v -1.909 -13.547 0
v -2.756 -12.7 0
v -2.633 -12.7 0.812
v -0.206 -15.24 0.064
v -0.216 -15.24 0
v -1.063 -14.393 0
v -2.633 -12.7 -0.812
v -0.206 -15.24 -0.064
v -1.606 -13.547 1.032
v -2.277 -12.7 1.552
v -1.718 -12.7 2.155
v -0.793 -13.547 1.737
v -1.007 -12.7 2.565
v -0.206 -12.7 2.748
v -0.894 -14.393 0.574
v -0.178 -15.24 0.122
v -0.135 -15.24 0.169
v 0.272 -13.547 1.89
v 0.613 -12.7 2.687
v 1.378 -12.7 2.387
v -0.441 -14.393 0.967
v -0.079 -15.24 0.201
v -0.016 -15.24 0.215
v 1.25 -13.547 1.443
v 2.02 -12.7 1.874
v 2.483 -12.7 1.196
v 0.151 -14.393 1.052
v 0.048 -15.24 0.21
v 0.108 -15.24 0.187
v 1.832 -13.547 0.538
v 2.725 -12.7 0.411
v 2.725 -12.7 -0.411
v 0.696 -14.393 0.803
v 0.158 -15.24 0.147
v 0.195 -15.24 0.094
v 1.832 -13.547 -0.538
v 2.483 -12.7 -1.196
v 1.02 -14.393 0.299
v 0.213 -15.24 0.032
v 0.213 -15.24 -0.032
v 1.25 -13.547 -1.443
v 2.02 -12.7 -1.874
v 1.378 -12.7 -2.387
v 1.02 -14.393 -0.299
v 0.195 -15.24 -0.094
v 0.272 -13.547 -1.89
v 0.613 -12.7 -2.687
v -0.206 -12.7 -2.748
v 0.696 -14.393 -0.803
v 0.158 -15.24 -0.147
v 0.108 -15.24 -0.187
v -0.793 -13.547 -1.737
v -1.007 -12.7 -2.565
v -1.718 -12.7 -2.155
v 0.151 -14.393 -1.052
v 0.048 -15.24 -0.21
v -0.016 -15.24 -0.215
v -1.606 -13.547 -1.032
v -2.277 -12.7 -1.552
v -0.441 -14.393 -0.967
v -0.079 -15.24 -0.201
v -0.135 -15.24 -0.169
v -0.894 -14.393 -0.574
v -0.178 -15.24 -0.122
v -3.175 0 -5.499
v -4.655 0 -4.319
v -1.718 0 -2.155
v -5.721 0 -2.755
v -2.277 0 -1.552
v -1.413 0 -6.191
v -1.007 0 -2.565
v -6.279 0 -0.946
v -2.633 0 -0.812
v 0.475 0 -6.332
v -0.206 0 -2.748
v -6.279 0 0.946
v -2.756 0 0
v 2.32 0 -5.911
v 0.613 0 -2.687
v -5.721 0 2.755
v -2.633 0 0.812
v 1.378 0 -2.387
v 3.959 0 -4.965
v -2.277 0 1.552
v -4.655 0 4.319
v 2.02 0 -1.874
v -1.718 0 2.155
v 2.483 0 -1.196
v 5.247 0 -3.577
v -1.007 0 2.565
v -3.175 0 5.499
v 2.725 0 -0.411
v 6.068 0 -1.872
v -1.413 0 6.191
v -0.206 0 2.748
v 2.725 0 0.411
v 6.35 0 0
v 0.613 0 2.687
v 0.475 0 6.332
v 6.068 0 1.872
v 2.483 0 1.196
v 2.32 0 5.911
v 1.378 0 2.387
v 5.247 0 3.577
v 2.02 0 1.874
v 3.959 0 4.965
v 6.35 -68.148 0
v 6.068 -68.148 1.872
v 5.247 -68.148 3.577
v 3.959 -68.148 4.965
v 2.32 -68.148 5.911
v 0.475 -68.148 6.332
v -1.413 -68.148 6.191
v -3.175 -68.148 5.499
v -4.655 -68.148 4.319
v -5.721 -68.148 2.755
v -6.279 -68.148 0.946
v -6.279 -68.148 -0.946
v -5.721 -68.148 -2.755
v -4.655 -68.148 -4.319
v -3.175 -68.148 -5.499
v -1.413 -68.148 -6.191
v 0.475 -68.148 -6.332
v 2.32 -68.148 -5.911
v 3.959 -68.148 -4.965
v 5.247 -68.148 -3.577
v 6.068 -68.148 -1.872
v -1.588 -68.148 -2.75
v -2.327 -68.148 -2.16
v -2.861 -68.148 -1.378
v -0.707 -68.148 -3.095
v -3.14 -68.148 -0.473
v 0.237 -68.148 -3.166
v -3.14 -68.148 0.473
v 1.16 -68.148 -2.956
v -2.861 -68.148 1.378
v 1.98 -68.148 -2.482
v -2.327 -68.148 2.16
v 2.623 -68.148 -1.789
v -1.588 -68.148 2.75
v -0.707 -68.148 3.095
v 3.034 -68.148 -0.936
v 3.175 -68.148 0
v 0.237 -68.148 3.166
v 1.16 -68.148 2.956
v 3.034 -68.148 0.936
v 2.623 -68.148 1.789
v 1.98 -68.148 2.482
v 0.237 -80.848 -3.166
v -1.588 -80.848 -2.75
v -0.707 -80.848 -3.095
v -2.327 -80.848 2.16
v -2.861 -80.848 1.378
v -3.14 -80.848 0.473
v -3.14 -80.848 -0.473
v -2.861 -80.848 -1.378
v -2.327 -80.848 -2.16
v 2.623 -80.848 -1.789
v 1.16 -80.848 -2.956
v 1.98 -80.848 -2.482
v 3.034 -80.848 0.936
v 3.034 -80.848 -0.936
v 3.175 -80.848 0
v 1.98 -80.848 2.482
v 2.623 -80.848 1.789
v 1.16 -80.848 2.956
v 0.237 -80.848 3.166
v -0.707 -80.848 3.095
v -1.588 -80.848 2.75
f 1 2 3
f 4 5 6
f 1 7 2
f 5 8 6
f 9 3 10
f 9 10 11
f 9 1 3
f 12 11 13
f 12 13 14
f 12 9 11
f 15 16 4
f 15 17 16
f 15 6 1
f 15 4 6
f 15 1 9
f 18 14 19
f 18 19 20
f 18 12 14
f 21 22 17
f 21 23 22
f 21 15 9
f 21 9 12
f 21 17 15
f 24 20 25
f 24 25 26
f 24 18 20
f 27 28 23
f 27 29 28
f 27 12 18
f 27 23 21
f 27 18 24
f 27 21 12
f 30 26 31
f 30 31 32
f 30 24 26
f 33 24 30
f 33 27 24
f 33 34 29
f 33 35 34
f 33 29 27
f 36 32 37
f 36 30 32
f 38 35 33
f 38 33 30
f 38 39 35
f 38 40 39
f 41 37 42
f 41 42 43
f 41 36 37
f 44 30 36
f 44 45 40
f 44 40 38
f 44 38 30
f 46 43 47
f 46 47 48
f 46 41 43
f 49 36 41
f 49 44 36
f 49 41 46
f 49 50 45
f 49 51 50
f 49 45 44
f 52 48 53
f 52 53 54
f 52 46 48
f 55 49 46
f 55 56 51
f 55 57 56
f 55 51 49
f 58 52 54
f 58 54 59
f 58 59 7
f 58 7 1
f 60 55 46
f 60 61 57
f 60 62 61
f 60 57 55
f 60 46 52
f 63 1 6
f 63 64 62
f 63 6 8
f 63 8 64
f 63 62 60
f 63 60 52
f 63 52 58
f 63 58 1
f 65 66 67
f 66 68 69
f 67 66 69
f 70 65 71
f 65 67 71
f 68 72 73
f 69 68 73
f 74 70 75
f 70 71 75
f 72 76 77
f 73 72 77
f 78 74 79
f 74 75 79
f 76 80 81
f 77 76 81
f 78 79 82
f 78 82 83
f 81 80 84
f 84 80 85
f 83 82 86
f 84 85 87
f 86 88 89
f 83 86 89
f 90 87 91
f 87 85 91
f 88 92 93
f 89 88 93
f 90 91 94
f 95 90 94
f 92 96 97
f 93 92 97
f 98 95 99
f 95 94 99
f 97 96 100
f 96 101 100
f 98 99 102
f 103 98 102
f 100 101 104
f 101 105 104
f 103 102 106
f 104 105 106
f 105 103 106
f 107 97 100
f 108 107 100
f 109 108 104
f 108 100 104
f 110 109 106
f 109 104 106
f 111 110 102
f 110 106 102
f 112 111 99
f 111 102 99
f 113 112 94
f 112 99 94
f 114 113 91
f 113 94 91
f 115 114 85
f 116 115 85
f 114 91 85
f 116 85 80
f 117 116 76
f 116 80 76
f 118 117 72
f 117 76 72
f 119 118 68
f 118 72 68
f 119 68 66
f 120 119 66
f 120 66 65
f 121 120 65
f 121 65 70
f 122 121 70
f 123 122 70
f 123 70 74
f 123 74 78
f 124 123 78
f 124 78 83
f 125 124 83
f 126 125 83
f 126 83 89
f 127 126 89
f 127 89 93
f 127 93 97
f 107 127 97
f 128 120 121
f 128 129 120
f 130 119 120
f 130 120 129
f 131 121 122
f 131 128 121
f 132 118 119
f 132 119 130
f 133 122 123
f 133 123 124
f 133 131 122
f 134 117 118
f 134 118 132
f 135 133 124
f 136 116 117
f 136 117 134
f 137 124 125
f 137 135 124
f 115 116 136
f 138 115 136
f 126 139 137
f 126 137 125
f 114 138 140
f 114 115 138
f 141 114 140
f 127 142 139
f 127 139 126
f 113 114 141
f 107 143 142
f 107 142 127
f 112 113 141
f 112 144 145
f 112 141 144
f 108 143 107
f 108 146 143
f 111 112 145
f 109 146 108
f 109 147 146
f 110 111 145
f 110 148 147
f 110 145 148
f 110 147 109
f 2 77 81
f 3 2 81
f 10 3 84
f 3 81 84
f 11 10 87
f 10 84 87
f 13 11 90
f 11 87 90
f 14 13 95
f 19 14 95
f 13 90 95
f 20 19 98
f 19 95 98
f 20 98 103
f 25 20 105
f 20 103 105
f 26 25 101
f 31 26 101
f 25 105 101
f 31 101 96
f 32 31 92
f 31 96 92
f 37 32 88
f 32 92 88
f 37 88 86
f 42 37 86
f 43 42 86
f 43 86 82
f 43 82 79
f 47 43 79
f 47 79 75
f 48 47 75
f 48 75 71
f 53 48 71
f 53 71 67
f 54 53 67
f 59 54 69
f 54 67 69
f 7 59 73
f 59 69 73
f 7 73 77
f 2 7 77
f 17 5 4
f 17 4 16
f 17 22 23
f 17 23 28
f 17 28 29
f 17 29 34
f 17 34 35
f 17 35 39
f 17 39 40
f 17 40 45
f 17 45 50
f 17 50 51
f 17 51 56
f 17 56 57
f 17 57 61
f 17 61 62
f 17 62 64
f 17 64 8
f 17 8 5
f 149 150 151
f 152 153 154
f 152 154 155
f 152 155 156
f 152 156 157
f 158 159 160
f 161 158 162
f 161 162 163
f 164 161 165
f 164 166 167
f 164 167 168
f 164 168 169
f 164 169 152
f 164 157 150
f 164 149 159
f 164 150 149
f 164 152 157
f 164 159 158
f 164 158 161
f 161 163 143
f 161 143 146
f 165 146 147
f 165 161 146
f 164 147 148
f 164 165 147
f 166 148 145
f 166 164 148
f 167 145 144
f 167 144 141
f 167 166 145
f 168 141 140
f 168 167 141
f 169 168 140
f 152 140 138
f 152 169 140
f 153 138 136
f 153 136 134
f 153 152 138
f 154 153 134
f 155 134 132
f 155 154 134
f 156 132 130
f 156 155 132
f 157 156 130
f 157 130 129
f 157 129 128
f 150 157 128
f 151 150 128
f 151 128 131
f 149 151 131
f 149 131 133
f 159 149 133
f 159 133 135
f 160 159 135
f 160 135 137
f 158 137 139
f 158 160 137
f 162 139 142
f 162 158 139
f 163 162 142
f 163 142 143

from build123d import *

# Parameters (mm, degrees)
F0_R     = 6.35
F1_DEPTH = 80.8482
F2_R     = 6.35
F2_R_2   = 3.175
F3_DEPTH = 12.7
F4_R     = 2.7559
F5_DEPTH = 12.7
F6_R     = 2.7559
F7_DEPTH = 2.54
F7_TAPER = 45


with BuildPart() as f1:
    # F0 (on Front) → F1 (new body)
    with BuildSketch(Plane.XZ):
        Circle(F0_R)
    extrude(amount=F1_DEPTH)

    # F2 (on face) → F3 (cut)
    with BuildSketch(Plane.XZ.offset(80.8482)):
        Circle(F2_R)
        Circle(F2_R_2, mode=Mode.SUBTRACT)
    extrude(amount=-F3_DEPTH, mode=Mode.SUBTRACT)

    # F4 (on face) → F5 (cut)
    with BuildSketch(Plane(origin=(0, 0, 0), x_dir=(-1, 0, 0), z_dir=(0, 1, 0))):
        Circle(F4_R)
    extrude(amount=-F5_DEPTH, mode=Mode.SUBTRACT)

    # F6 (on face) → F7 (cut)
    with BuildSketch(Plane(origin=(0, -12.7, 0), x_dir=(-1, 0, 0), z_dir=(0, 1, 0))):
        Circle(F6_R)
    extrude(amount=-F7_DEPTH, taper=F7_TAPER, mode=Mode.SUBTRACT)


solid = f1.part
